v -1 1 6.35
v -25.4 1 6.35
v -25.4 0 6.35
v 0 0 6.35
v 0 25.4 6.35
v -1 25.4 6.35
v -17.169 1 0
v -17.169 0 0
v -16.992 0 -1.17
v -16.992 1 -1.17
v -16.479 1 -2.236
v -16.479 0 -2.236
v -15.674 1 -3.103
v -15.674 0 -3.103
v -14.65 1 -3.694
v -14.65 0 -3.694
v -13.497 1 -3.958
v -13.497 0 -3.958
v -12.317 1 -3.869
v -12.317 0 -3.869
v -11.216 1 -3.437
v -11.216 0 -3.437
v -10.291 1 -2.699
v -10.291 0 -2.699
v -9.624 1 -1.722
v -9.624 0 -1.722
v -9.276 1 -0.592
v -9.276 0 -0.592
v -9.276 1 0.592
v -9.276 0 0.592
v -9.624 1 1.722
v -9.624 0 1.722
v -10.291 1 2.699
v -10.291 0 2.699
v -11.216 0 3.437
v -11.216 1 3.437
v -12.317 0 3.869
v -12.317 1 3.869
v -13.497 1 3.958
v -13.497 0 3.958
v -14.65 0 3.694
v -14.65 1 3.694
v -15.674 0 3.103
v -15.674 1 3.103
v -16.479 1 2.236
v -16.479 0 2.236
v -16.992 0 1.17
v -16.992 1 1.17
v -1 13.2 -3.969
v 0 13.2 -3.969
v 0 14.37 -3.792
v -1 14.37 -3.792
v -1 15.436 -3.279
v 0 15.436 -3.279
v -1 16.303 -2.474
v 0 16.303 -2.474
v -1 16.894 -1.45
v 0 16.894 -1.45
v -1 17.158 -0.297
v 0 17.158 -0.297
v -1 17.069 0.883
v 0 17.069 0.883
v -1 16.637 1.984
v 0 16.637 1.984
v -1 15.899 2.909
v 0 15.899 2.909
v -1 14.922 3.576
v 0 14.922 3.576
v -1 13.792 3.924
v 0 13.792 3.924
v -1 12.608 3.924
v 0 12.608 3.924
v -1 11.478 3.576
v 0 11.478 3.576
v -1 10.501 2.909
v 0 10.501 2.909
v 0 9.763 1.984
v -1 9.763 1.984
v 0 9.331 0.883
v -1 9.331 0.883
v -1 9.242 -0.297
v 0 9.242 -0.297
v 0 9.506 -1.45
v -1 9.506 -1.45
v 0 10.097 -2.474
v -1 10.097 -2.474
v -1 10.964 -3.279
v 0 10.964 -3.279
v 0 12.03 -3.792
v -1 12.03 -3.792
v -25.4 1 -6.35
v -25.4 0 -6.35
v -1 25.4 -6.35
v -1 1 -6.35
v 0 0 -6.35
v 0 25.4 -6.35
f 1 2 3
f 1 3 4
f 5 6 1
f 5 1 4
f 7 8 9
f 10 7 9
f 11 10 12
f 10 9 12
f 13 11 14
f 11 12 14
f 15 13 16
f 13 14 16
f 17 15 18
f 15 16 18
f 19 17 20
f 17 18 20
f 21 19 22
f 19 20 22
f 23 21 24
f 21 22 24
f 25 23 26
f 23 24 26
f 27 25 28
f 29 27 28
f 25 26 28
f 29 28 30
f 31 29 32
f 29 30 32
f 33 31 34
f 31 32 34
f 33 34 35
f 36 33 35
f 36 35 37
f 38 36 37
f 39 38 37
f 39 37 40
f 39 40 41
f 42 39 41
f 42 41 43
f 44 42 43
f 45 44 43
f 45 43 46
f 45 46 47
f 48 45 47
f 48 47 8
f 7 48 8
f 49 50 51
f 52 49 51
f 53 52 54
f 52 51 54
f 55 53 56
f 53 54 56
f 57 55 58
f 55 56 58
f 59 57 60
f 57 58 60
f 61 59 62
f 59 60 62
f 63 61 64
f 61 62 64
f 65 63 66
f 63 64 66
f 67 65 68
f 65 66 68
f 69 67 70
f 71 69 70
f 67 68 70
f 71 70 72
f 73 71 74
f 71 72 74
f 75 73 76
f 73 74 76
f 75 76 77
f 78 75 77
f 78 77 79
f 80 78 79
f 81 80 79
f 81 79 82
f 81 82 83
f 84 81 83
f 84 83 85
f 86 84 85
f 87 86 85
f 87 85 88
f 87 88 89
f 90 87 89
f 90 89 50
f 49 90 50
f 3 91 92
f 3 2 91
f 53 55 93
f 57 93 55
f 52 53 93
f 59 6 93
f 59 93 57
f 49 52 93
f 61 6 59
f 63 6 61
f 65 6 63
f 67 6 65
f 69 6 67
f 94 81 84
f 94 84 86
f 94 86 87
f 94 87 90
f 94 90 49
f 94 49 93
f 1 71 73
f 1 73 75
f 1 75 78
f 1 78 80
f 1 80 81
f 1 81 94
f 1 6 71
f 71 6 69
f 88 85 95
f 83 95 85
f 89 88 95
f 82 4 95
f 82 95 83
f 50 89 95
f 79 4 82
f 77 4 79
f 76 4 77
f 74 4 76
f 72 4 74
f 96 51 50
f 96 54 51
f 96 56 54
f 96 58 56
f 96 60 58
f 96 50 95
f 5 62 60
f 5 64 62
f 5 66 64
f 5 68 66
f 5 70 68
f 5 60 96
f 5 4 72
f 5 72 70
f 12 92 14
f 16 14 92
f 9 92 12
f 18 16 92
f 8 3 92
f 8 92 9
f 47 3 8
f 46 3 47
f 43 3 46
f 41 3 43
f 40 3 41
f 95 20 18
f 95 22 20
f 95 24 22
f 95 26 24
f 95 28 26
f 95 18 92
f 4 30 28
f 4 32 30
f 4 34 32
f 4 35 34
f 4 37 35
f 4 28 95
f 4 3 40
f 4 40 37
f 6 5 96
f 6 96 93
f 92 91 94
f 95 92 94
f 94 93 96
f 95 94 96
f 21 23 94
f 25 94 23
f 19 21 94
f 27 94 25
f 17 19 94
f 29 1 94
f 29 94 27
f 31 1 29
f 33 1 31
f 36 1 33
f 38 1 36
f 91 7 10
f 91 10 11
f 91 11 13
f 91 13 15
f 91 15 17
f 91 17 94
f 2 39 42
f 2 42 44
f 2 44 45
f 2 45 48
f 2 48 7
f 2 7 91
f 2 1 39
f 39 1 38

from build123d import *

# Parameters (mm, degrees)
BOSS_EXTRUDE1_DEPTH            = 6.35
F_5_16_0_3125_DIAMETER_HOLE1_D = 7.9375
F_5_16_0_3125_DIAMETER_HOLE2_D = 7.9375


with BuildPart() as part:
    # Sketch1 → Boss-Extrude1 (new body, symmetric)
    with BuildSketch(Plane.XY):
        Polygon((0, 0), (0, 25.4), (-1, 25.4), (-1, 1), (-25.4, 1), (-25.4, 0), align=None)
    extrude(amount=BOSS_EXTRUDE1_DEPTH, both=True)

    # 5/16 (0.3125) Diameter Hole1 (through all)
    with Locations(Plane.ZY.offset(1)):
        with Locations((0, 13.2)):
            Hole(F_5_16_0_3125_DIAMETER_HOLE1_D / 2)

    # 5/16 (0.3125) Diameter Hole2 (through all)
    with Locations(Plane(origin=(-13.2, 1, 0), x_dir=(1, 0, 0), z_dir=(0, 1, 0))):
        with Locations((0, 0)):
            Hole(F_5_16_0_3125_DIAMETER_HOLE2_D / 2)


solid = part.part
